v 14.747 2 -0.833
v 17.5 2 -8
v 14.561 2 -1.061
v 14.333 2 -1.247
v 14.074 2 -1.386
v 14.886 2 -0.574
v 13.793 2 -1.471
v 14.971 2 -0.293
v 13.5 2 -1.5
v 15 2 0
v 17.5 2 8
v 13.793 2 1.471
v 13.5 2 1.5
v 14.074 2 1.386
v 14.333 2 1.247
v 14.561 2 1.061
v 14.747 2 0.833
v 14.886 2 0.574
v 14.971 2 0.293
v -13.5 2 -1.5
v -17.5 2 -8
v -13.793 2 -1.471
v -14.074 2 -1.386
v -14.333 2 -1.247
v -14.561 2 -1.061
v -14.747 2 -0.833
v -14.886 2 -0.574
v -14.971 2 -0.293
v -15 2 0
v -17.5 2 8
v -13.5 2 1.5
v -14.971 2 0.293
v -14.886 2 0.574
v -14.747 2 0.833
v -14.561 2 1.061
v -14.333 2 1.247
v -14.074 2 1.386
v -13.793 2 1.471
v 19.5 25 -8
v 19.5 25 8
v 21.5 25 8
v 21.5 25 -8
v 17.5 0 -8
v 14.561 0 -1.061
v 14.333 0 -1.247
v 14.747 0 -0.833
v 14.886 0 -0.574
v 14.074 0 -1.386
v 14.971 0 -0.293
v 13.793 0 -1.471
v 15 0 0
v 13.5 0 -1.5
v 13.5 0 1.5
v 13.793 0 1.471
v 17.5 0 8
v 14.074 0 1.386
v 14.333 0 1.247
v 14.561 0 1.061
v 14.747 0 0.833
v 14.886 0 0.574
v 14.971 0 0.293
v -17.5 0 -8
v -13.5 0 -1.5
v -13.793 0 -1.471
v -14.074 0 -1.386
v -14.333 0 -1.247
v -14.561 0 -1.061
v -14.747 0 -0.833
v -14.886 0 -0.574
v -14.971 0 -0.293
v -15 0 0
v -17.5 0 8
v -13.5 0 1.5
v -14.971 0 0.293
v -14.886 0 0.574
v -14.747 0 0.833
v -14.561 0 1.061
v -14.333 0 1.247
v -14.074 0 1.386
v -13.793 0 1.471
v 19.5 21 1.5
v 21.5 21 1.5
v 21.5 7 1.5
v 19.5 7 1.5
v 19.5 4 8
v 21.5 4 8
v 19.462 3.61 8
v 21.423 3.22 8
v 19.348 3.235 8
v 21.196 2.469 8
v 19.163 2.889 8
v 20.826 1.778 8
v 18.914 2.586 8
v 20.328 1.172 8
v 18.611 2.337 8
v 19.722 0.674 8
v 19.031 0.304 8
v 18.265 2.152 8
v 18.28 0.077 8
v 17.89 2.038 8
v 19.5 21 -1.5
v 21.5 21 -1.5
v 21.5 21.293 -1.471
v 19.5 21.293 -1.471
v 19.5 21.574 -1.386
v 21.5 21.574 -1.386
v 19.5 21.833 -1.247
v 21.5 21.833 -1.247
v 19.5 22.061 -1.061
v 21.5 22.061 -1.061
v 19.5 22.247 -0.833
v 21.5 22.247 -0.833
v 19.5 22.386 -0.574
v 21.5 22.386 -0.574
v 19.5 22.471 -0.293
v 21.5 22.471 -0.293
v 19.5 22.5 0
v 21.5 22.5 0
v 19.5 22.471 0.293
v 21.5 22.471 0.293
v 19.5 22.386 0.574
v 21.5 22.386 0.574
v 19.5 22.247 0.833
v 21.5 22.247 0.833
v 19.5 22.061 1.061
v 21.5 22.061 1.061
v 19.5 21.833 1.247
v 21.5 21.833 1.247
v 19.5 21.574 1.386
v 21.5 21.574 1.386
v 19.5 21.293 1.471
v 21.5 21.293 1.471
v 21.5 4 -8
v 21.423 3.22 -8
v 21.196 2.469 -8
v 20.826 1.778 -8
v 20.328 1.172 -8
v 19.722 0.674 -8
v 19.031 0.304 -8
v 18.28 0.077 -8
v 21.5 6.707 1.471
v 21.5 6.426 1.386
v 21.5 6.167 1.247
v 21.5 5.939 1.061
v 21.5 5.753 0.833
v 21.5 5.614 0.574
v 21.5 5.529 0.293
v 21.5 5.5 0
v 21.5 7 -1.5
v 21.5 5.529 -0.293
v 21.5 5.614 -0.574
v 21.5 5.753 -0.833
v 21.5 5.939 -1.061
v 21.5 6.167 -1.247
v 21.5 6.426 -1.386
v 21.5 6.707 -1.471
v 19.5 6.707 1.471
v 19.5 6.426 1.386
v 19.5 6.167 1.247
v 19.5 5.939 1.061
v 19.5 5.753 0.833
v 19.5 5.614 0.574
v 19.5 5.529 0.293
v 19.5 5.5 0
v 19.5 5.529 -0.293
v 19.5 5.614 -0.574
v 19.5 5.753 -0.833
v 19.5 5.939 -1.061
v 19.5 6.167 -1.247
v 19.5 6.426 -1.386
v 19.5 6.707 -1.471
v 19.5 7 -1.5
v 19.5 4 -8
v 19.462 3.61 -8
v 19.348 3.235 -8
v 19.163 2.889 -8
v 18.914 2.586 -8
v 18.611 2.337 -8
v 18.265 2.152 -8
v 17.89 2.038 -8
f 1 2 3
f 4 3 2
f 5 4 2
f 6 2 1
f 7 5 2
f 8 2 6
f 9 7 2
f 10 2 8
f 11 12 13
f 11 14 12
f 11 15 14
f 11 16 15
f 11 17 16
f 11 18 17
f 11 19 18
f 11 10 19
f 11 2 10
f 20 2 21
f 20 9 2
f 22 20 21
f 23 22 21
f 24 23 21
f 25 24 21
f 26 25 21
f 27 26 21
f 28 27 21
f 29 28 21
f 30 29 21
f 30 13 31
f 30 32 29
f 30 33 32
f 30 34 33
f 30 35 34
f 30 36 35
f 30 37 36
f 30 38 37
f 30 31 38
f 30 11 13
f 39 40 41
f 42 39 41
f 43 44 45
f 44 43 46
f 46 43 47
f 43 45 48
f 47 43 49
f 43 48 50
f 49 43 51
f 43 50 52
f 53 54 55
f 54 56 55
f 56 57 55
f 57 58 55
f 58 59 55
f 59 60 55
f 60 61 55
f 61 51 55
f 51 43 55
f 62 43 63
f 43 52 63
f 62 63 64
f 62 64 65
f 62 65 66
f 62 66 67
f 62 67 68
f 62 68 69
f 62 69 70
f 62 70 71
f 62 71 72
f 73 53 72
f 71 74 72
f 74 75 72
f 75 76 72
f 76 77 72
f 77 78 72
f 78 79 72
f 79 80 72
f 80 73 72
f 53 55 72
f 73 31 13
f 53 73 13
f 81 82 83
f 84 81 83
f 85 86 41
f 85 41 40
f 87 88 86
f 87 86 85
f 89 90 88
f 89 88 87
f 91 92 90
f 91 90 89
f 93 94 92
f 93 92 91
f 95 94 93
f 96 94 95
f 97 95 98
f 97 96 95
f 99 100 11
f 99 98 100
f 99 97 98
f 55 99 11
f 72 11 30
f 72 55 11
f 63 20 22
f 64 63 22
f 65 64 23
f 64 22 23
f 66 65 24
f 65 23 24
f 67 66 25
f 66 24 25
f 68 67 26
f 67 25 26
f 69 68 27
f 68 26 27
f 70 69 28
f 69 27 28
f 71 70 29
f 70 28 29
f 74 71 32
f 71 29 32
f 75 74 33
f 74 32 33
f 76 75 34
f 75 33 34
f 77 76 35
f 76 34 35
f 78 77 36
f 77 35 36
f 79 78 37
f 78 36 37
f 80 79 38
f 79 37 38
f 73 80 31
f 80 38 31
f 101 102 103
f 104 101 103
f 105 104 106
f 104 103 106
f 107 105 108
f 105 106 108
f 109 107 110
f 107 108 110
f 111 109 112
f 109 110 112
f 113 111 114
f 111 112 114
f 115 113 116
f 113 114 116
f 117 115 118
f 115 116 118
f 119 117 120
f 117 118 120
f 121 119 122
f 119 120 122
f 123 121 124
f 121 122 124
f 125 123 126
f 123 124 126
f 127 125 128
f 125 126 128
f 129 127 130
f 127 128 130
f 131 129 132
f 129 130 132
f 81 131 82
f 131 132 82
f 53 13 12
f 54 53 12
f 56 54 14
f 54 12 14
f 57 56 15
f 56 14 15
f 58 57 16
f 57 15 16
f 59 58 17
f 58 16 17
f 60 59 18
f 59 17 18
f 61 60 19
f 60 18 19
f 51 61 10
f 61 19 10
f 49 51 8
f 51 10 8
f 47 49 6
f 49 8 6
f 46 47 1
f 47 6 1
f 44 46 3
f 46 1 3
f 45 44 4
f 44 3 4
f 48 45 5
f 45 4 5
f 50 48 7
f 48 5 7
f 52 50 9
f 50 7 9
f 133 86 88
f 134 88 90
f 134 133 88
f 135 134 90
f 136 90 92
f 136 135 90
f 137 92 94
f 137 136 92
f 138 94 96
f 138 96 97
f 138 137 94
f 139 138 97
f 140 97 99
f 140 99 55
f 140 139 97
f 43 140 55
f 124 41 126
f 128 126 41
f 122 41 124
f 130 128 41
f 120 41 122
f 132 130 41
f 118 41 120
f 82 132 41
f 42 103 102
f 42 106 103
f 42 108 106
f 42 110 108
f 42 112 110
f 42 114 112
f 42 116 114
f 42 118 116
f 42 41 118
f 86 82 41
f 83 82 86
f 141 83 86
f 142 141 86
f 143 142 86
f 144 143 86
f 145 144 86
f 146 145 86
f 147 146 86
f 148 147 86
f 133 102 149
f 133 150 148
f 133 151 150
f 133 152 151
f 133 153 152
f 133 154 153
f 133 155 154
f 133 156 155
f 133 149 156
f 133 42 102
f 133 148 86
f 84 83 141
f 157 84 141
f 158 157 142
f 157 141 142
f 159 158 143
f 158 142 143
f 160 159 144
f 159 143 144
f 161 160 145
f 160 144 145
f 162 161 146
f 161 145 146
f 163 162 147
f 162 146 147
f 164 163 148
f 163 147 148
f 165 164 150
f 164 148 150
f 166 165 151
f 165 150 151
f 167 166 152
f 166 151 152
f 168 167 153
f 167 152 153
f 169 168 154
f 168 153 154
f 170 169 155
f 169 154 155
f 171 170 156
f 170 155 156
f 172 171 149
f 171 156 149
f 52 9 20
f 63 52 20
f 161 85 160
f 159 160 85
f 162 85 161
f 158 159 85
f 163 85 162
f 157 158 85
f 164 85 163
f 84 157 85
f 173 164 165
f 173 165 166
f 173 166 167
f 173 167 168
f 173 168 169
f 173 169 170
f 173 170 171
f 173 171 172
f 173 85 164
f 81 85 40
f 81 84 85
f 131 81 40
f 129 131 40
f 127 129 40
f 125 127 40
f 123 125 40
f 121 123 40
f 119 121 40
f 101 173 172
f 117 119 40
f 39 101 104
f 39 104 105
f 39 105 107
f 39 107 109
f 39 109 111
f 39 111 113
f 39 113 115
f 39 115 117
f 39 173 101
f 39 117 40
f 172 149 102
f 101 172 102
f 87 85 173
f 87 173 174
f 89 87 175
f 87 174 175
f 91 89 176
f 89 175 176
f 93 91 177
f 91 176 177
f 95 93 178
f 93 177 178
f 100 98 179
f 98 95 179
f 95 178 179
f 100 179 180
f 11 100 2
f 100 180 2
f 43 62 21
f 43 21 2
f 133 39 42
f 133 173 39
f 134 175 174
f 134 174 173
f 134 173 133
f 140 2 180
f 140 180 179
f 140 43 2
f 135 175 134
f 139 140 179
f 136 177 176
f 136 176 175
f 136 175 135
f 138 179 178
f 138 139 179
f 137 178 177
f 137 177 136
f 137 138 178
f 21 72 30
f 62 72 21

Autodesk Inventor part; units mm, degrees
ref_plane "YZ Plane" through (0, 0, 0) normal (1, 0, 0) x (0, 1, 0)
ref_plane "XZ Plane" through (0, 0, 0) normal (0, 1, 0) x (-1, 0, 0)
ref_plane "XY Plane" through (0, 0, 0) normal (0, 0, 1) x (1, 0, 0)
sketch "スケッチ1" plane through (0, 0, 0) normal (0, 1, 0) x (-1, 0, 0)
  line L0 (-17.5, 8) -> (17.5, 8)
  line L1 (17.5, 8) -> (17.5, -8)
  line L2 (17.5, -8) -> (-17.5, -8)
  line L3 (-17.5, -8) -> (-17.5, 8)
  line L4 (-17.5, 8) -> (17.5, -8) construction
  line L5 (17.5, 8) -> (-17.5, -8) construction
  point P0 (0, 0)
  dimension "d0" = 35
  dimension "d1" = 16
extrude "プレート1" add sketch "スケッチ1" along normal blind 2
sketch "スケッチ2" plane through (19.5, 4, -8) normal (1, 0, 0) x (0, 1, 0)
  line L0 (0, 16) -> (0, 0)
  line L1 (0, 0) -> (21, 0)
  line L2 (21, 0) -> (21, 16)
  line L3 (21, 16) -> (0, 16)
edge flange "フランジ1" height 25 angle 90 thickness 2 bend radius 2 thickness toward (1, 0, 0) relief tear relief width 2 relief depth 1 edges at (17.5, 2, 0) wall of the first edge with corners at (19.5, 4, 8) (19.5, 4, -8) (19.5, 25, -8) (19.5, 25, 8)
bend "曲げ1"
corner "コーナー1"
sketch "スケッチ3" plane through (21.5, 25, 8) normal (1, 0, 0) x (0, 0, -1)
  line L0 (6.5, -4) -> (6.5, -18)
  arc A0 (6.5, -18) -> (9.5, -18) centre (8, -18) ccw
  line L1 (9.5, -18) -> (9.5, -4)
  arc A1 (9.5, -4) -> (6.5, -4) centre (8, -4) ccw
  line L2 (16, 0) -> (16, -21) projected
  line L3 (0, 0) -> (16, 0) projected
  point P0 (8, -25)
  point P1 (8, 0)
  dimension "d19" = 1.5
extrude "押し出し1" cut sketch "スケッチ3" against normal blind 10
sketch "スケッチ4" plane through (0, 2, 0) normal (0, 1, 0) x (1, 0, 0)
  line L0 (-13.5, -1.5) -> (13.5, -1.5)
  arc A0 (13.5, -1.5) -> (13.5, 1.5) centre (13.5, 0) ccw
  line L1 (13.5, 1.5) -> (-13.5, 1.5)
  arc A1 (-13.5, 1.5) -> (-13.5, -1.5) centre (-13.5, 0) ccw
  line L2 (-17.5, -8) -> (-17.5, 8) projected
  line L3 (17.5, 8) -> (17.5, -8) projected
  point P0 (0, 0)
  dimension "d23" = 4
  dimension "d24" = 4
  dimension "d25" = 1.5
extrude "押し出し2" cut sketch "スケッチ4" against normal blind 10
equation "\"d2\" = Thickness"
equation "\"d3\" = BendReliefWidth"
equation "\"d4\" = BendReliefDepth"
equation "\"d5\" = MinimumRemnant"
equation "\"d6\" = TransitionRadius"
equation "\"d9\" = BendRadius"
equation "\"d10\" = CornerReliefSize"
equation "\"d11\" = GapSize"
equation "\"d12\" = JacobiRadiusSize"
equation "\"BendRadius\" = Thickness"
equation "\"BendReliefWidth\" = Thickness"
equation "\"BendReliefDepth\" = 0.5 * Thickness"
equation "\"CornerReliefSize\" = 4 * Thickness"
equation "\"MinimumRemnant\" = 2 * Thickness"
equation "\"TransitionRadius\" = BendRadius"
equation "\"JacobiRadiusSize\" = BendRadius"
equation "\"GapSize\" = Thickness"
equation "\"Thickness\" = 2"
properties part number "keyL_extended" material "アルミニウム 6061"
